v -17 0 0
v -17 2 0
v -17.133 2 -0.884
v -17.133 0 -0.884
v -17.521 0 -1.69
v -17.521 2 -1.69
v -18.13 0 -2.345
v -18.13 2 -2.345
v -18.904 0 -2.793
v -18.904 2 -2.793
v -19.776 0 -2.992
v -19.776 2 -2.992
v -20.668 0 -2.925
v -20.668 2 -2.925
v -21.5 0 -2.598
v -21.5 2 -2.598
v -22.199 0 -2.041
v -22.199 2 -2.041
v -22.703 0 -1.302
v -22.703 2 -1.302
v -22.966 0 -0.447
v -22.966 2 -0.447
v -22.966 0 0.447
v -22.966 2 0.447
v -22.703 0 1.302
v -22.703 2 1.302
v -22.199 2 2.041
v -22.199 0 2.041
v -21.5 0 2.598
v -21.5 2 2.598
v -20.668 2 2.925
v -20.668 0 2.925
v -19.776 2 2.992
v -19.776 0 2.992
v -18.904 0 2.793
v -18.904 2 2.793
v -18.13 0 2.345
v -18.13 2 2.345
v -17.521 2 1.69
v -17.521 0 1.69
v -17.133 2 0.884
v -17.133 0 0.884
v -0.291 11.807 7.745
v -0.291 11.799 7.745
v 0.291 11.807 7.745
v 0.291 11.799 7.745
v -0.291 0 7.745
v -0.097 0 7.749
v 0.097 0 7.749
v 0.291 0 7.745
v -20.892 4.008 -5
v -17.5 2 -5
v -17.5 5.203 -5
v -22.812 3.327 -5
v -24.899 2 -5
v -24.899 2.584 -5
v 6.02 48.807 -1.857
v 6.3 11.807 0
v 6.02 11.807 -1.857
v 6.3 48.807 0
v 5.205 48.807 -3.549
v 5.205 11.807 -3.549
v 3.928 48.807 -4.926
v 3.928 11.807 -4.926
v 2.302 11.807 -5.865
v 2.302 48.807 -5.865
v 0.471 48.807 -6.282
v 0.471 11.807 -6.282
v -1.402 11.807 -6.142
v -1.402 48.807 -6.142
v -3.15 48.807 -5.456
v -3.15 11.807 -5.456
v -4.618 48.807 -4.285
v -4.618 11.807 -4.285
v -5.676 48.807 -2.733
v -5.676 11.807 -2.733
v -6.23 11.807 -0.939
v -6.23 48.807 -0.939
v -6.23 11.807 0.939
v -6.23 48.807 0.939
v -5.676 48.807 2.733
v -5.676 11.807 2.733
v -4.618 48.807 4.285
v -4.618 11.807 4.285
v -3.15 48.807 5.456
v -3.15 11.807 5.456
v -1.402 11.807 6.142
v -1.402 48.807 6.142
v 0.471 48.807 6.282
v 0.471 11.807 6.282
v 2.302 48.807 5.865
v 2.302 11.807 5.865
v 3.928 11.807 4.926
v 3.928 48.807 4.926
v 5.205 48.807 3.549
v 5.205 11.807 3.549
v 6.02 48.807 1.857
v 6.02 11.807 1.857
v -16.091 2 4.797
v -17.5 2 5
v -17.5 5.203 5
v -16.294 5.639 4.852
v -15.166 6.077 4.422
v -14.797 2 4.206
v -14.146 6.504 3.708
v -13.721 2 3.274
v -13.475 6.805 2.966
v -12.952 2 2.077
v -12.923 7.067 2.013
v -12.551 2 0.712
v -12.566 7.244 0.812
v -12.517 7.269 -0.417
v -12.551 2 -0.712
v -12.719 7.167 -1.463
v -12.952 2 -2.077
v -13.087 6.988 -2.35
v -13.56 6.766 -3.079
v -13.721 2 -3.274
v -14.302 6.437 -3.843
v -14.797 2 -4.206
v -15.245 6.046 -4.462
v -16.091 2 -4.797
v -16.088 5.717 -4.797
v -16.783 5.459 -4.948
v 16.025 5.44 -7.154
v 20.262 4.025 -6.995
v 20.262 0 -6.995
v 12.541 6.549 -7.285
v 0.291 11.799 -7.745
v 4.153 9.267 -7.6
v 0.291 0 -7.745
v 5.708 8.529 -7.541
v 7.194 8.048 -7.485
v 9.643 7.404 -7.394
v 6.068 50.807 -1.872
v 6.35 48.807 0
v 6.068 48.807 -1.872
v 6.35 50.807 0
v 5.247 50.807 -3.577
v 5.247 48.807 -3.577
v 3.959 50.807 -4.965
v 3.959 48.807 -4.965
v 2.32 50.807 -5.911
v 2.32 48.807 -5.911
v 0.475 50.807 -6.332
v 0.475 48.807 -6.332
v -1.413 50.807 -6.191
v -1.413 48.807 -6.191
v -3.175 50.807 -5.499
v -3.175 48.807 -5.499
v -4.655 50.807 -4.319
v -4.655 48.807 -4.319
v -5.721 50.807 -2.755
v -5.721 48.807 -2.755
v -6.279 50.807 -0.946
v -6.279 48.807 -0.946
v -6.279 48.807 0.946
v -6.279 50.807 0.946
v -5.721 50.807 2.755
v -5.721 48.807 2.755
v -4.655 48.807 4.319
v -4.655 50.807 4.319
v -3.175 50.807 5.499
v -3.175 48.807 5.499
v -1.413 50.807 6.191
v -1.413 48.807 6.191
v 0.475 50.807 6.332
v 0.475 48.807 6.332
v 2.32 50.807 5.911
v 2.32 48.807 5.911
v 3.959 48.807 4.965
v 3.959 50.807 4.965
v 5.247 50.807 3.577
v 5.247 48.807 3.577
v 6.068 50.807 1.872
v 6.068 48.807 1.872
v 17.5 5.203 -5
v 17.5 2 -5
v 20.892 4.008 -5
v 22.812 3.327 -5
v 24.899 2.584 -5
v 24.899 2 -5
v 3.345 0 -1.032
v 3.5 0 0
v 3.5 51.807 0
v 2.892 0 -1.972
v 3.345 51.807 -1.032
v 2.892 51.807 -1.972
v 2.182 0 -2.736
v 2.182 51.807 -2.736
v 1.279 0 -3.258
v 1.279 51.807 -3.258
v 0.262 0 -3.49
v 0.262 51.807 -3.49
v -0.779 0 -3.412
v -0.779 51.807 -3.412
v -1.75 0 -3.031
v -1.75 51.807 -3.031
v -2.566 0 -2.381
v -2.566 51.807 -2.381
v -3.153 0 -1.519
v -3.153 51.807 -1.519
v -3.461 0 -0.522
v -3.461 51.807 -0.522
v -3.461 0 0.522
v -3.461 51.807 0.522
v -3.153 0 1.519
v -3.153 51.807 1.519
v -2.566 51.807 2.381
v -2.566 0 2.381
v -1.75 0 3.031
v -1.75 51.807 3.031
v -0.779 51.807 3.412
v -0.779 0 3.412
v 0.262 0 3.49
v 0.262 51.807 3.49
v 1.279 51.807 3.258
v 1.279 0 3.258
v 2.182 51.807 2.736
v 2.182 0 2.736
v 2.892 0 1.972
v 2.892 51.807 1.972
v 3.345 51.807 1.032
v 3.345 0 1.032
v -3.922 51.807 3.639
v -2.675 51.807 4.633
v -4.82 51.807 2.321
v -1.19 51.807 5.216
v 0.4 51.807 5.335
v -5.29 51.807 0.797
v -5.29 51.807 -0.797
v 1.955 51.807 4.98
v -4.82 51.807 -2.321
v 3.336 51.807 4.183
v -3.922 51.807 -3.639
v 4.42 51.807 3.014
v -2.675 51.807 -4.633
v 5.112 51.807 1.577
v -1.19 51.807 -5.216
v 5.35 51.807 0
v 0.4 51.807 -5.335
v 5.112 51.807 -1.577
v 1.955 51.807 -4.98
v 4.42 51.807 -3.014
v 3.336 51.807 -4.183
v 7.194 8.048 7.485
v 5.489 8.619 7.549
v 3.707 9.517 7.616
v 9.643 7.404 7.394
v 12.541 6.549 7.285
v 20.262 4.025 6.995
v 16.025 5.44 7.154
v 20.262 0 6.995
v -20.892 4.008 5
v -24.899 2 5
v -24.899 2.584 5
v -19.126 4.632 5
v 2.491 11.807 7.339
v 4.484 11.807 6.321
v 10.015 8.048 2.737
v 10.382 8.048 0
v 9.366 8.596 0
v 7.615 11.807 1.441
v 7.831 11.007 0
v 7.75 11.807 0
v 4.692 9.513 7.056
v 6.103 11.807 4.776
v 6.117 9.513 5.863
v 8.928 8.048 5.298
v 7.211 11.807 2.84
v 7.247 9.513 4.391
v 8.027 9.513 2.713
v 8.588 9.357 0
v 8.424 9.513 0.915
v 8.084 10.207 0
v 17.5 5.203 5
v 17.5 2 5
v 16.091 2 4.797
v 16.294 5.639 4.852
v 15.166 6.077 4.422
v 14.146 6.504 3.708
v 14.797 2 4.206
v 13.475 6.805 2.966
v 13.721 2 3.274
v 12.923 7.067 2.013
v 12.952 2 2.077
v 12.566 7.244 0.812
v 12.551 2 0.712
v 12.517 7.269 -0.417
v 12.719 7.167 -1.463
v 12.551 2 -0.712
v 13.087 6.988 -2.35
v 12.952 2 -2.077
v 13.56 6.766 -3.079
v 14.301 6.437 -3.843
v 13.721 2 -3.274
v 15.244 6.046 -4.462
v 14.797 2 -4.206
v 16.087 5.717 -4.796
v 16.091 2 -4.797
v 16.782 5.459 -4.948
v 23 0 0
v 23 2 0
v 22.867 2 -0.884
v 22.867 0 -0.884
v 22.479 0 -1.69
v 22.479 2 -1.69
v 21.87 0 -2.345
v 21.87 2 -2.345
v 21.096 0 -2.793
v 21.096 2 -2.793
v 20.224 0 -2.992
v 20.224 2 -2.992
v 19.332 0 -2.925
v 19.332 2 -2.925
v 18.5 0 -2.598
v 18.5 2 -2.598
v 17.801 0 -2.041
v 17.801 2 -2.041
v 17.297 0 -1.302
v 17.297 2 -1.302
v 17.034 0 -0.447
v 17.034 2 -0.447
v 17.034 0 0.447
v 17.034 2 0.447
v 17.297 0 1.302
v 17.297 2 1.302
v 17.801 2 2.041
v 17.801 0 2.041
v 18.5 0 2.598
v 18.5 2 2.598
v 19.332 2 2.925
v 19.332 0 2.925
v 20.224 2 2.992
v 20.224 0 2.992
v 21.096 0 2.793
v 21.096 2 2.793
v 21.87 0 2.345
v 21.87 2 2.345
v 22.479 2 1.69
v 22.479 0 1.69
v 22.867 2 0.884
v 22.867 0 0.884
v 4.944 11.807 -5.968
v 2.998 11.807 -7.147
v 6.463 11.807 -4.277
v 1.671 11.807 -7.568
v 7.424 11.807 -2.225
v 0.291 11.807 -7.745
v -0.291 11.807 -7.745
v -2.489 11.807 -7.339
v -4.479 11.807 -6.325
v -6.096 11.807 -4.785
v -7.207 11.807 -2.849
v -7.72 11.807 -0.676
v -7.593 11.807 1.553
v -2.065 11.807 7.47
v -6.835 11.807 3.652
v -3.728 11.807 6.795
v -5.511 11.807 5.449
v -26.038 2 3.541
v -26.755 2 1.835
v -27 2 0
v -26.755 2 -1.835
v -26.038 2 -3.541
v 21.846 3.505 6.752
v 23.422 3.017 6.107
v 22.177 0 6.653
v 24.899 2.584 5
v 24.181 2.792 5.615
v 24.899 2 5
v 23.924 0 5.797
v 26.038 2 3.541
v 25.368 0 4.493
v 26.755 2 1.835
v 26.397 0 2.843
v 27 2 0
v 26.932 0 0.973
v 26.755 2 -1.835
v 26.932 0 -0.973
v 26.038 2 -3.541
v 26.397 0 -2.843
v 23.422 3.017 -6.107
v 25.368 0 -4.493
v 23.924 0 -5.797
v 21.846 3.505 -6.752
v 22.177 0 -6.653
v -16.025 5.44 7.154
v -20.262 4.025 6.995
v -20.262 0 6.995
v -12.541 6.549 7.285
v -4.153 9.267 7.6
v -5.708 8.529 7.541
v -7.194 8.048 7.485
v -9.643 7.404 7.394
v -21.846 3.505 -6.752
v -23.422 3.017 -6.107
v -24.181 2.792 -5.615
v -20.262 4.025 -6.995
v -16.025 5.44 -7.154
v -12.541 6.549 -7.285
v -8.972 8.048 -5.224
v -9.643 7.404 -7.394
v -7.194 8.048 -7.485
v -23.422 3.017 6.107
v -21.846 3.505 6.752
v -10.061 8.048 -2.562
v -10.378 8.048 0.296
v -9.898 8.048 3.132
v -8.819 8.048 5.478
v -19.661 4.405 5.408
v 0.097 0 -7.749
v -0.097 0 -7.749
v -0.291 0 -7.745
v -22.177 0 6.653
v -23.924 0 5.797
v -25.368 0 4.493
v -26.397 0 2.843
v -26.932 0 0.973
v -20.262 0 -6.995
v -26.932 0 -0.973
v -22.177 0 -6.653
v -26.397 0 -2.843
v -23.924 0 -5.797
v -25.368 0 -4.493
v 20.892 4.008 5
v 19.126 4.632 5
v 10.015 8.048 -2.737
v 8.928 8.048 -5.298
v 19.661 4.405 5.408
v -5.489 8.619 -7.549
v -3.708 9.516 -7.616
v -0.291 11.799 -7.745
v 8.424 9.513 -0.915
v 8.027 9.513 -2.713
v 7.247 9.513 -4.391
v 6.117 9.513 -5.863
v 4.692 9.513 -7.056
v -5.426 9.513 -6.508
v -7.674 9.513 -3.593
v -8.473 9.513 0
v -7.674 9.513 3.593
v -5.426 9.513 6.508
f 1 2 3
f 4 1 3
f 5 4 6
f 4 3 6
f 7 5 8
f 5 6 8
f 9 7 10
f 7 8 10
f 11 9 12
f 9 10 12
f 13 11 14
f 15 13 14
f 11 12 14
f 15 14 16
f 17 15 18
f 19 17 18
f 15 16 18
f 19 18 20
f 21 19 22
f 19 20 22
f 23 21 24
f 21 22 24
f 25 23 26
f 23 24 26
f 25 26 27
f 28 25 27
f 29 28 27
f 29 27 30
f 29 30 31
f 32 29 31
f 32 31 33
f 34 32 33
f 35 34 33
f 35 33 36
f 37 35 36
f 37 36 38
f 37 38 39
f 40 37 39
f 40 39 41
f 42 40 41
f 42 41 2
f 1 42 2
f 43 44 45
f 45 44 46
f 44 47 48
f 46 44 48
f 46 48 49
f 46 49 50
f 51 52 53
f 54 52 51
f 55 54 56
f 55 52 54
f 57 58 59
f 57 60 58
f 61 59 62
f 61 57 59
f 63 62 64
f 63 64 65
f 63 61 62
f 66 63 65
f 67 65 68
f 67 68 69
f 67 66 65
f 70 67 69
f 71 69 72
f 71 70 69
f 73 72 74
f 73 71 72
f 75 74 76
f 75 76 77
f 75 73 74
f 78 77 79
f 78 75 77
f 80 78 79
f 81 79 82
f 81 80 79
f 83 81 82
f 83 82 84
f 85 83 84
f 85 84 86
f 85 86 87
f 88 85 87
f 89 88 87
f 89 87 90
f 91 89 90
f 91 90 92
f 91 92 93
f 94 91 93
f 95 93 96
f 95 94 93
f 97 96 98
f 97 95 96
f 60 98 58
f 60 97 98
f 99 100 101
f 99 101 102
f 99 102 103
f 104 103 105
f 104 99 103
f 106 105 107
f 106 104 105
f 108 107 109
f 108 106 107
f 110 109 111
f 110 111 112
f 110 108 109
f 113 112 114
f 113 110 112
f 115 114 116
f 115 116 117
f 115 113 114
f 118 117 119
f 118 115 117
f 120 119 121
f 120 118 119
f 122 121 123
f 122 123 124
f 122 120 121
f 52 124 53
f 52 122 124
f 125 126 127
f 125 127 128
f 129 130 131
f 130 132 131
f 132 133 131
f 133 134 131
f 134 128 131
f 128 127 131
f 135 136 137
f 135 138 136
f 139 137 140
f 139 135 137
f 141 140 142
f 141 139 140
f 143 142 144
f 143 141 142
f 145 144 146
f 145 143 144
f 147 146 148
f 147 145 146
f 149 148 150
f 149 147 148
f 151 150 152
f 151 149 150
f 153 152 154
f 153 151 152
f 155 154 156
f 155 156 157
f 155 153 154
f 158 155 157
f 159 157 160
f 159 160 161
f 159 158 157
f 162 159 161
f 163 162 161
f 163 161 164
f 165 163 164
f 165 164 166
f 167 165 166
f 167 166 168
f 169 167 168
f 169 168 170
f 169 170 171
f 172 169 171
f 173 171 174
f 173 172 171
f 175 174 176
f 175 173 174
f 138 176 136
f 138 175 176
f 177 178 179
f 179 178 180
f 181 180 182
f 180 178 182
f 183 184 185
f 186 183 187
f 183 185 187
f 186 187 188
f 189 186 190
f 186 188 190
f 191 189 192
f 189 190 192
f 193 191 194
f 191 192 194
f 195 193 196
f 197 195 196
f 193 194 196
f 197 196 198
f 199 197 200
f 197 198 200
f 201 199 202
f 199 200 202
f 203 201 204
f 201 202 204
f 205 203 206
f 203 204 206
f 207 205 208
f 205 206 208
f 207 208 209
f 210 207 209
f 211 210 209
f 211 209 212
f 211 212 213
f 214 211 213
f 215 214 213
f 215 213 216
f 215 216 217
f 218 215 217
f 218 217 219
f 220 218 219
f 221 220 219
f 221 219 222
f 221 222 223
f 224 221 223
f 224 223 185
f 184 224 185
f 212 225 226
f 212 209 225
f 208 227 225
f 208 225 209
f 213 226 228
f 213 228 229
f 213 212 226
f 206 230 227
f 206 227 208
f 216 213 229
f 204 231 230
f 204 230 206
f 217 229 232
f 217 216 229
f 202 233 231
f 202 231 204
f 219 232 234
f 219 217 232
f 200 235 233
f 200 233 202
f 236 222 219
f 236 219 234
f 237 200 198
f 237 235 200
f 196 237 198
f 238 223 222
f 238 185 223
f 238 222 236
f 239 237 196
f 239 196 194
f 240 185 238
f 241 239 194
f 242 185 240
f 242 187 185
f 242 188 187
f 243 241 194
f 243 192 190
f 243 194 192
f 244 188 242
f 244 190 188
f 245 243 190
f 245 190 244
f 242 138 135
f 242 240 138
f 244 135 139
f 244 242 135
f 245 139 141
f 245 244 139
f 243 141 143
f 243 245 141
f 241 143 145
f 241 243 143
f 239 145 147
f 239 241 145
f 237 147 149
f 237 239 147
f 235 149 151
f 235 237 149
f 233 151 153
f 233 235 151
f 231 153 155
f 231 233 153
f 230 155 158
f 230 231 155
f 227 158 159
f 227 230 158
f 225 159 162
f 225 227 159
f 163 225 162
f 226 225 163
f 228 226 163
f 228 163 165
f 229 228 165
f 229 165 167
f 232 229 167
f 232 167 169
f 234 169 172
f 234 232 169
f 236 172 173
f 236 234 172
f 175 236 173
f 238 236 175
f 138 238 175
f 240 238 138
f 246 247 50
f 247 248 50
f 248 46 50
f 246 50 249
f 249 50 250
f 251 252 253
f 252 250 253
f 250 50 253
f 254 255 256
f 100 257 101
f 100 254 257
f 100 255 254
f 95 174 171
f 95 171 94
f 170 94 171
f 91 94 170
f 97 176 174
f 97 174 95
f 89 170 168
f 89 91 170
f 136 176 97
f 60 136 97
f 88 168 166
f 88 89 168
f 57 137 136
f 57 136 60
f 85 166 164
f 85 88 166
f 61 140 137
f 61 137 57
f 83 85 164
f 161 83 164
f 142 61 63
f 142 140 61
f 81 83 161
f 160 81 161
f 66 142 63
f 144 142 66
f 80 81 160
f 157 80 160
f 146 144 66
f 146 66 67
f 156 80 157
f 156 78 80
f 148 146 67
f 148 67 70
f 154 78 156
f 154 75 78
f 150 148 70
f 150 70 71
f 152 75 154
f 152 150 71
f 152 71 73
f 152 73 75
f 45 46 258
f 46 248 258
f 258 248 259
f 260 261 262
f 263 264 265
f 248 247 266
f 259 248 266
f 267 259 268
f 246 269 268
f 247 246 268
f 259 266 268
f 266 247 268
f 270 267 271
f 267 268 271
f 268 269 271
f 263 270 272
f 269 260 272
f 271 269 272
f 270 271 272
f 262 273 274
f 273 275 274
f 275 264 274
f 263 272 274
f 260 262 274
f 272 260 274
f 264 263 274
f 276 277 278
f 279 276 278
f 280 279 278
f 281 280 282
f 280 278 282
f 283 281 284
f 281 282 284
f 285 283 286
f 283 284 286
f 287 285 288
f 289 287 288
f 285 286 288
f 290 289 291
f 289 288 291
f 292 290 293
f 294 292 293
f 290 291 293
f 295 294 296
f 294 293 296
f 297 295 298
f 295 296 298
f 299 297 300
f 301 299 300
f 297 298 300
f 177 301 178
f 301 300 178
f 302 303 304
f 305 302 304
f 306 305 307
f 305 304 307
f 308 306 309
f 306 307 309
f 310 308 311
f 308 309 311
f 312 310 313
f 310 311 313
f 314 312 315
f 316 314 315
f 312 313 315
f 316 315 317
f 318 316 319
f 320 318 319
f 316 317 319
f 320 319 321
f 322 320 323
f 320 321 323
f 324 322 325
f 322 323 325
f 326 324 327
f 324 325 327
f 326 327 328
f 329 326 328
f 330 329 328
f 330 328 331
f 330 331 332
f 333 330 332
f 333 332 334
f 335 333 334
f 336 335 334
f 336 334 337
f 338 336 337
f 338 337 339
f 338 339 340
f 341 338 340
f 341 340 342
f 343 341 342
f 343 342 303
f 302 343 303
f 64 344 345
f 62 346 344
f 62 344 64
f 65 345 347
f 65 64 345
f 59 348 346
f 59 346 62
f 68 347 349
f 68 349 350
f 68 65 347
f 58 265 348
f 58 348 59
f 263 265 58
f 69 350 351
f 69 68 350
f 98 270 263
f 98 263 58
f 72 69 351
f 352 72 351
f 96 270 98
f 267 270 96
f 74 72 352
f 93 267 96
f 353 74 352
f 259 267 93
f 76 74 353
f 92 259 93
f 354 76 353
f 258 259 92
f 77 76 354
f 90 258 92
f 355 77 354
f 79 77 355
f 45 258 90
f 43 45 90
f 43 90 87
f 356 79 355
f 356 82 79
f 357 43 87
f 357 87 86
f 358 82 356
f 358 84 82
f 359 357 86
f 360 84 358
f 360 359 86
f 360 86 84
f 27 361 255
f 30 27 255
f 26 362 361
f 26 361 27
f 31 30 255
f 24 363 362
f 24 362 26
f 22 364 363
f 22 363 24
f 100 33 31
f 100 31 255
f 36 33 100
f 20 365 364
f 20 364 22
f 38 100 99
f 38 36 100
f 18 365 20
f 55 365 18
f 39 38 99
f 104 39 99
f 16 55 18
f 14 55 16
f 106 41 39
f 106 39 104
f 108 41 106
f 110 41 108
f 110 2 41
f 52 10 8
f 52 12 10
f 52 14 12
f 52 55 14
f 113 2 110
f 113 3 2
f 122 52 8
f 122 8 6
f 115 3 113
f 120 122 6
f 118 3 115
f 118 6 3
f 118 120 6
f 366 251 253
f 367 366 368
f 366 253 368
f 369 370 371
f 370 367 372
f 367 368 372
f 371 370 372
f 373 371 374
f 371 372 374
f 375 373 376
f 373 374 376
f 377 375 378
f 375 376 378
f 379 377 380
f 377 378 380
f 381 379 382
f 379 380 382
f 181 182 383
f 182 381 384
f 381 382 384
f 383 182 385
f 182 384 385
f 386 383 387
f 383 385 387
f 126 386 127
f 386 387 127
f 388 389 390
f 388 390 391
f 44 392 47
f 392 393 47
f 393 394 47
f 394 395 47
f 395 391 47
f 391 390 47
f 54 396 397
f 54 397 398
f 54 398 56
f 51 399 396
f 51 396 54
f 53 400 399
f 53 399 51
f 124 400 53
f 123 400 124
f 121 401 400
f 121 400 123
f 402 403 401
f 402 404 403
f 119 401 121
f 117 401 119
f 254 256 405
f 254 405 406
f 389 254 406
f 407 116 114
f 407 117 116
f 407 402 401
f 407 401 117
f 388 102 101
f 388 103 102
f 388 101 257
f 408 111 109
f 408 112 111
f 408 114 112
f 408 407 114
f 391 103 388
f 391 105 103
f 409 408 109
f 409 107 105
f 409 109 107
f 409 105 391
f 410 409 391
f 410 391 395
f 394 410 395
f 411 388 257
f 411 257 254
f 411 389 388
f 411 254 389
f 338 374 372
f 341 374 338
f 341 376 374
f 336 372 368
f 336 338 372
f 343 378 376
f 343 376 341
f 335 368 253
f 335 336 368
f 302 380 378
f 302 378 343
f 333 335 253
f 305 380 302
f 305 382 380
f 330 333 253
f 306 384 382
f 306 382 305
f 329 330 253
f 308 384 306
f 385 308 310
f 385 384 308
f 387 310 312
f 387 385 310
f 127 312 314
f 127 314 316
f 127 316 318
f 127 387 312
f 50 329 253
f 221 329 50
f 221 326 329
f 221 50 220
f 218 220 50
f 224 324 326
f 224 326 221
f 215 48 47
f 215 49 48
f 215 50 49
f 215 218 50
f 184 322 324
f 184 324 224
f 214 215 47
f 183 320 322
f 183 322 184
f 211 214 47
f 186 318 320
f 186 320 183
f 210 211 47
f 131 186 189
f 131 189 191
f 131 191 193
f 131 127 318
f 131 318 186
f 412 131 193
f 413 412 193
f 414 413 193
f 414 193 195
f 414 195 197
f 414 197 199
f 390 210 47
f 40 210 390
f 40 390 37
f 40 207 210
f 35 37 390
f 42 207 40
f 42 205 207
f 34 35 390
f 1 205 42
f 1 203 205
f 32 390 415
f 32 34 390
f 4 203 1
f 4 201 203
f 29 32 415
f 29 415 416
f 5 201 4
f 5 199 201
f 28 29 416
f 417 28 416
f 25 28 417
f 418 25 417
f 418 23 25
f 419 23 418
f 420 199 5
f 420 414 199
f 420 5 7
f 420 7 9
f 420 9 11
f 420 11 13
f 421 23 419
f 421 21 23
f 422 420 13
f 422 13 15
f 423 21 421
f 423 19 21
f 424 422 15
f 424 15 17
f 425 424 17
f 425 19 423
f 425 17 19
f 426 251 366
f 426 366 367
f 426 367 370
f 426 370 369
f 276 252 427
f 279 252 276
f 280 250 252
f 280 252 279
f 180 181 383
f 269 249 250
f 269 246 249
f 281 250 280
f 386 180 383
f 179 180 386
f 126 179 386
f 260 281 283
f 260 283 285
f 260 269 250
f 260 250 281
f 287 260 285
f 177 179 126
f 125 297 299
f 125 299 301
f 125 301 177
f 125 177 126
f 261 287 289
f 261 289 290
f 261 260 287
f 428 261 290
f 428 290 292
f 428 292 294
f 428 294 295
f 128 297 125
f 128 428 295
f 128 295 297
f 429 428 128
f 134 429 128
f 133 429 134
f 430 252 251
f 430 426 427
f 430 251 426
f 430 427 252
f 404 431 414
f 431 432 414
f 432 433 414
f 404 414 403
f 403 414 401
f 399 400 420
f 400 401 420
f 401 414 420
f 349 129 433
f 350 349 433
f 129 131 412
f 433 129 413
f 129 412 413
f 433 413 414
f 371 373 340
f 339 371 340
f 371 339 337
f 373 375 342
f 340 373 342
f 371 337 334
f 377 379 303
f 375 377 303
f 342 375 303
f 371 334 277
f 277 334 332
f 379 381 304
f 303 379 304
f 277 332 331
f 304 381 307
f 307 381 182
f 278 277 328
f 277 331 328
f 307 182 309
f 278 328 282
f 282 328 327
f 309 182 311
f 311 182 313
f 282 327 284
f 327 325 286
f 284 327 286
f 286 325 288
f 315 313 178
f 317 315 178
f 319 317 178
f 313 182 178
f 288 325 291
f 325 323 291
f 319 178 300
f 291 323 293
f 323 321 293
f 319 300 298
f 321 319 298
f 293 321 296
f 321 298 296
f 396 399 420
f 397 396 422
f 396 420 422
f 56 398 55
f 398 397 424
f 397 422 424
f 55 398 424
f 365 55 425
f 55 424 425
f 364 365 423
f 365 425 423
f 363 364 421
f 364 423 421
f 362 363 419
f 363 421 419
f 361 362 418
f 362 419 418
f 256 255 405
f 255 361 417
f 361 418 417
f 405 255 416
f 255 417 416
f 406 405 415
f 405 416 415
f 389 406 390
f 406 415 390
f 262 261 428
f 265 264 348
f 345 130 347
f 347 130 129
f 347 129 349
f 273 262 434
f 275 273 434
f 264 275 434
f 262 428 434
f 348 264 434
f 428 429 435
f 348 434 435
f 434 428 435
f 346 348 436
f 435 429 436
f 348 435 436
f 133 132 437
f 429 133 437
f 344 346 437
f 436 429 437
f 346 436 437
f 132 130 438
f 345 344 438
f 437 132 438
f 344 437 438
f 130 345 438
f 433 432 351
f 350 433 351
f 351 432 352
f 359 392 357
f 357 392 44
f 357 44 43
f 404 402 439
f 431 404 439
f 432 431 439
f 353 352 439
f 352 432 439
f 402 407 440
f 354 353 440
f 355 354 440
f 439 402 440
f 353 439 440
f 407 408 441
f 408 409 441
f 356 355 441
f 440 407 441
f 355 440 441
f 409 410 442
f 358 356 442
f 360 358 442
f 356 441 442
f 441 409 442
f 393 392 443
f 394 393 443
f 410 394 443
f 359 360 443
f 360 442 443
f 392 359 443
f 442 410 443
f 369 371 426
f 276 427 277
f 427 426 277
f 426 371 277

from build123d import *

# Parameters (mm, degrees)
SZKIC1_W                        = 27
SZKIC1_H                        = 25
ZAOKR_GLENIE1_R                 = 4
SZKIC4_R                        = 3
WYTNIJ_WYCI_GNI_CIE3_DEPTH      = 24.0000001
WYTNIJ_WYCI_GNI_CIE3_DEPTH_BACK = 3
WYTNIJ_WYCI_GNI_CIE2_DEPTH      = 24.0000001
SZKIC5_OUTSIDE_W                = 72.072
SZKIC5_OUTSIDE_H                = 72.072
WYTNIJ_WYCI_GNI_CIE4_DEPTH      = 26.0000001
SZKIC8_W                        = 7.75
SZKIC8_H                        = 13.192742838
SZKIC10_R                       = 3.5
WYTNIJ_WYCI_GNI_CIE5_DEPTH      = 52.807257262


with BuildPart() as part:
    # Szkic1 → Obrót1 (revolve)
    with BuildSketch(Plane.XY):
        with Locations((13.5, 12.5)):
            Rectangle(SZKIC1_W, SZKIC1_H)
    revolve(axis=Axis((0, 0, 0), (0, 1, 0)))

    # Szkic2 → Wycięcie-obrót1 (revolve, cut)
    with BuildSketch(Plane.XY):
        Polygon((27, 25), (27, 2), (7.75, 9.00642701), (7.75, 25), align=None)
    revolve(axis=Axis((0, 0, 0), (0, 1, 0)), mode=Mode.SUBTRACT)

    # Zaokrąglenie1
    zaokr_glenie1_edges = [part.edges().sort_by_distance(p)[0] for p in [
        (-7.75, 9.00642701, 0),
    ]]
    fillet(zaokr_glenie1_edges, radius=ZAOKR_GLENIE1_R)

    # Szkic4 → Wytnij-wyciągnięcie3 (cut, two sides)
    with BuildSketch(Plane(origin=(0, 2, 0), x_dir=(1, 0, 0), z_dir=(0, 1, 0))) as wytnij_wyci_gni_cie3_sk:
        with Locations((-20, 0)):
            Circle(SZKIC4_R)
        with Locations((20, 0)):
            Circle(SZKIC4_R)
    extrude(amount=WYTNIJ_WYCI_GNI_CIE3_DEPTH, mode=Mode.SUBTRACT)
    extrude(wytnij_wyci_gni_cie3_sk.sketch, amount=-WYTNIJ_WYCI_GNI_CIE3_DEPTH_BACK, mode=Mode.SUBTRACT)

    # Szkic3 → Wytnij-wyciągnięcie2 (cut, through all)
    with BuildSketch(Plane(origin=(0, 2, 0), x_dir=(1, 0, 0), z_dir=(0, 1, 0))):
        with BuildLine():
            Line((-17.5, 5), (-26.532998323, 5))
            ThreePointArc((-26.532998323, 5), (-27, 0), (-26.532998323, -5))
            Line((-26.532998323, -5), (-17.5, -5))
            ThreePointArc((-17.5, -5), (-12.5, 0), (-17.5, 5))
        make_face()
        with BuildLine():
            Line((17.5, 5), (26.532998323, 5))
            ThreePointArc((26.532998323, 5), (27, 0), (26.532998323, -5))
            Line((26.532998323, -5), (17.5, -5))
            ThreePointArc((17.5, -5), (12.5, 0), (17.5, 5))
        make_face()
    extrude(amount=WYTNIJ_WYCI_GNI_CIE2_DEPTH, mode=Mode.SUBTRACT)

    # Szkic5 outside → Wytnij-wyciągnięcie4 (cut, through all)
    with BuildSketch(Plane.XZ):
        Rectangle(SZKIC5_OUTSIDE_W, SZKIC5_OUTSIDE_H)
        with BuildLine():
            Line((-20.2625, 6.995076393), (-0.290625, 7.744548864))
            ThreePointArc((-0.290625, 7.744548864), (0, 7.75), (0.290625, 7.744548864))
            Line((0.290625, 7.744548864), (20.2625, 6.995076393))
            ThreePointArc((20.2625, 6.995076393), (27, 0), (20.2625, -6.995076393))
            Line((20.2625, -6.995076393), (0.290625, -7.744548864))
            ThreePointArc((0.290625, -7.744548864), (0, -7.75), (-0.290625, -7.744548864))
            Line((-0.290625, -7.744548864), (-20.2625, -6.995076393))
            ThreePointArc((-20.2625, -6.995076393), (-27, 0), (-20.2625, 6.995076393))
        make_face(mode=Mode.SUBTRACT)
    extrude(amount=-WYTNIJ_WYCI_GNI_CIE4_DEPTH, mode=Mode.SUBTRACT)

    # Szkic8 → Wycięcie-obrót2 (revolve, cut)
    with BuildSketch(Plane.XY):
        with Locations((3.875, 18.403628581)):
            Rectangle(SZKIC8_W, SZKIC8_H)
    revolve(axis=Axis((0, 25, 0), (0, -1, 0)), mode=Mode.SUBTRACT)

    # Szkic9 → Obrót2 (revolve)
    with BuildSketch(Plane.XY):
        Polygon((5.35, 51.807257162), (0, 51.807257162), (0, 11.807257162), (6.3, 11.807257162), (6.3, 48.807257162), (6.35, 48.807257162), (6.35, 50.807257162), align=None)
    revolve(axis=Axis((0, 11.807257162, 0), (0, 1, 0)))

    # Szkic10 → Wytnij-wyciągnięcie5 (cut, through all)
    with BuildSketch(Plane(origin=(0, 51.807257162, 0), x_dir=(1, 0, 0), z_dir=(0, 1, 0))):
        Circle(SZKIC10_R)
    extrude(amount=-WYTNIJ_WYCI_GNI_CIE5_DEPTH, mode=Mode.SUBTRACT)


solid = part.part
